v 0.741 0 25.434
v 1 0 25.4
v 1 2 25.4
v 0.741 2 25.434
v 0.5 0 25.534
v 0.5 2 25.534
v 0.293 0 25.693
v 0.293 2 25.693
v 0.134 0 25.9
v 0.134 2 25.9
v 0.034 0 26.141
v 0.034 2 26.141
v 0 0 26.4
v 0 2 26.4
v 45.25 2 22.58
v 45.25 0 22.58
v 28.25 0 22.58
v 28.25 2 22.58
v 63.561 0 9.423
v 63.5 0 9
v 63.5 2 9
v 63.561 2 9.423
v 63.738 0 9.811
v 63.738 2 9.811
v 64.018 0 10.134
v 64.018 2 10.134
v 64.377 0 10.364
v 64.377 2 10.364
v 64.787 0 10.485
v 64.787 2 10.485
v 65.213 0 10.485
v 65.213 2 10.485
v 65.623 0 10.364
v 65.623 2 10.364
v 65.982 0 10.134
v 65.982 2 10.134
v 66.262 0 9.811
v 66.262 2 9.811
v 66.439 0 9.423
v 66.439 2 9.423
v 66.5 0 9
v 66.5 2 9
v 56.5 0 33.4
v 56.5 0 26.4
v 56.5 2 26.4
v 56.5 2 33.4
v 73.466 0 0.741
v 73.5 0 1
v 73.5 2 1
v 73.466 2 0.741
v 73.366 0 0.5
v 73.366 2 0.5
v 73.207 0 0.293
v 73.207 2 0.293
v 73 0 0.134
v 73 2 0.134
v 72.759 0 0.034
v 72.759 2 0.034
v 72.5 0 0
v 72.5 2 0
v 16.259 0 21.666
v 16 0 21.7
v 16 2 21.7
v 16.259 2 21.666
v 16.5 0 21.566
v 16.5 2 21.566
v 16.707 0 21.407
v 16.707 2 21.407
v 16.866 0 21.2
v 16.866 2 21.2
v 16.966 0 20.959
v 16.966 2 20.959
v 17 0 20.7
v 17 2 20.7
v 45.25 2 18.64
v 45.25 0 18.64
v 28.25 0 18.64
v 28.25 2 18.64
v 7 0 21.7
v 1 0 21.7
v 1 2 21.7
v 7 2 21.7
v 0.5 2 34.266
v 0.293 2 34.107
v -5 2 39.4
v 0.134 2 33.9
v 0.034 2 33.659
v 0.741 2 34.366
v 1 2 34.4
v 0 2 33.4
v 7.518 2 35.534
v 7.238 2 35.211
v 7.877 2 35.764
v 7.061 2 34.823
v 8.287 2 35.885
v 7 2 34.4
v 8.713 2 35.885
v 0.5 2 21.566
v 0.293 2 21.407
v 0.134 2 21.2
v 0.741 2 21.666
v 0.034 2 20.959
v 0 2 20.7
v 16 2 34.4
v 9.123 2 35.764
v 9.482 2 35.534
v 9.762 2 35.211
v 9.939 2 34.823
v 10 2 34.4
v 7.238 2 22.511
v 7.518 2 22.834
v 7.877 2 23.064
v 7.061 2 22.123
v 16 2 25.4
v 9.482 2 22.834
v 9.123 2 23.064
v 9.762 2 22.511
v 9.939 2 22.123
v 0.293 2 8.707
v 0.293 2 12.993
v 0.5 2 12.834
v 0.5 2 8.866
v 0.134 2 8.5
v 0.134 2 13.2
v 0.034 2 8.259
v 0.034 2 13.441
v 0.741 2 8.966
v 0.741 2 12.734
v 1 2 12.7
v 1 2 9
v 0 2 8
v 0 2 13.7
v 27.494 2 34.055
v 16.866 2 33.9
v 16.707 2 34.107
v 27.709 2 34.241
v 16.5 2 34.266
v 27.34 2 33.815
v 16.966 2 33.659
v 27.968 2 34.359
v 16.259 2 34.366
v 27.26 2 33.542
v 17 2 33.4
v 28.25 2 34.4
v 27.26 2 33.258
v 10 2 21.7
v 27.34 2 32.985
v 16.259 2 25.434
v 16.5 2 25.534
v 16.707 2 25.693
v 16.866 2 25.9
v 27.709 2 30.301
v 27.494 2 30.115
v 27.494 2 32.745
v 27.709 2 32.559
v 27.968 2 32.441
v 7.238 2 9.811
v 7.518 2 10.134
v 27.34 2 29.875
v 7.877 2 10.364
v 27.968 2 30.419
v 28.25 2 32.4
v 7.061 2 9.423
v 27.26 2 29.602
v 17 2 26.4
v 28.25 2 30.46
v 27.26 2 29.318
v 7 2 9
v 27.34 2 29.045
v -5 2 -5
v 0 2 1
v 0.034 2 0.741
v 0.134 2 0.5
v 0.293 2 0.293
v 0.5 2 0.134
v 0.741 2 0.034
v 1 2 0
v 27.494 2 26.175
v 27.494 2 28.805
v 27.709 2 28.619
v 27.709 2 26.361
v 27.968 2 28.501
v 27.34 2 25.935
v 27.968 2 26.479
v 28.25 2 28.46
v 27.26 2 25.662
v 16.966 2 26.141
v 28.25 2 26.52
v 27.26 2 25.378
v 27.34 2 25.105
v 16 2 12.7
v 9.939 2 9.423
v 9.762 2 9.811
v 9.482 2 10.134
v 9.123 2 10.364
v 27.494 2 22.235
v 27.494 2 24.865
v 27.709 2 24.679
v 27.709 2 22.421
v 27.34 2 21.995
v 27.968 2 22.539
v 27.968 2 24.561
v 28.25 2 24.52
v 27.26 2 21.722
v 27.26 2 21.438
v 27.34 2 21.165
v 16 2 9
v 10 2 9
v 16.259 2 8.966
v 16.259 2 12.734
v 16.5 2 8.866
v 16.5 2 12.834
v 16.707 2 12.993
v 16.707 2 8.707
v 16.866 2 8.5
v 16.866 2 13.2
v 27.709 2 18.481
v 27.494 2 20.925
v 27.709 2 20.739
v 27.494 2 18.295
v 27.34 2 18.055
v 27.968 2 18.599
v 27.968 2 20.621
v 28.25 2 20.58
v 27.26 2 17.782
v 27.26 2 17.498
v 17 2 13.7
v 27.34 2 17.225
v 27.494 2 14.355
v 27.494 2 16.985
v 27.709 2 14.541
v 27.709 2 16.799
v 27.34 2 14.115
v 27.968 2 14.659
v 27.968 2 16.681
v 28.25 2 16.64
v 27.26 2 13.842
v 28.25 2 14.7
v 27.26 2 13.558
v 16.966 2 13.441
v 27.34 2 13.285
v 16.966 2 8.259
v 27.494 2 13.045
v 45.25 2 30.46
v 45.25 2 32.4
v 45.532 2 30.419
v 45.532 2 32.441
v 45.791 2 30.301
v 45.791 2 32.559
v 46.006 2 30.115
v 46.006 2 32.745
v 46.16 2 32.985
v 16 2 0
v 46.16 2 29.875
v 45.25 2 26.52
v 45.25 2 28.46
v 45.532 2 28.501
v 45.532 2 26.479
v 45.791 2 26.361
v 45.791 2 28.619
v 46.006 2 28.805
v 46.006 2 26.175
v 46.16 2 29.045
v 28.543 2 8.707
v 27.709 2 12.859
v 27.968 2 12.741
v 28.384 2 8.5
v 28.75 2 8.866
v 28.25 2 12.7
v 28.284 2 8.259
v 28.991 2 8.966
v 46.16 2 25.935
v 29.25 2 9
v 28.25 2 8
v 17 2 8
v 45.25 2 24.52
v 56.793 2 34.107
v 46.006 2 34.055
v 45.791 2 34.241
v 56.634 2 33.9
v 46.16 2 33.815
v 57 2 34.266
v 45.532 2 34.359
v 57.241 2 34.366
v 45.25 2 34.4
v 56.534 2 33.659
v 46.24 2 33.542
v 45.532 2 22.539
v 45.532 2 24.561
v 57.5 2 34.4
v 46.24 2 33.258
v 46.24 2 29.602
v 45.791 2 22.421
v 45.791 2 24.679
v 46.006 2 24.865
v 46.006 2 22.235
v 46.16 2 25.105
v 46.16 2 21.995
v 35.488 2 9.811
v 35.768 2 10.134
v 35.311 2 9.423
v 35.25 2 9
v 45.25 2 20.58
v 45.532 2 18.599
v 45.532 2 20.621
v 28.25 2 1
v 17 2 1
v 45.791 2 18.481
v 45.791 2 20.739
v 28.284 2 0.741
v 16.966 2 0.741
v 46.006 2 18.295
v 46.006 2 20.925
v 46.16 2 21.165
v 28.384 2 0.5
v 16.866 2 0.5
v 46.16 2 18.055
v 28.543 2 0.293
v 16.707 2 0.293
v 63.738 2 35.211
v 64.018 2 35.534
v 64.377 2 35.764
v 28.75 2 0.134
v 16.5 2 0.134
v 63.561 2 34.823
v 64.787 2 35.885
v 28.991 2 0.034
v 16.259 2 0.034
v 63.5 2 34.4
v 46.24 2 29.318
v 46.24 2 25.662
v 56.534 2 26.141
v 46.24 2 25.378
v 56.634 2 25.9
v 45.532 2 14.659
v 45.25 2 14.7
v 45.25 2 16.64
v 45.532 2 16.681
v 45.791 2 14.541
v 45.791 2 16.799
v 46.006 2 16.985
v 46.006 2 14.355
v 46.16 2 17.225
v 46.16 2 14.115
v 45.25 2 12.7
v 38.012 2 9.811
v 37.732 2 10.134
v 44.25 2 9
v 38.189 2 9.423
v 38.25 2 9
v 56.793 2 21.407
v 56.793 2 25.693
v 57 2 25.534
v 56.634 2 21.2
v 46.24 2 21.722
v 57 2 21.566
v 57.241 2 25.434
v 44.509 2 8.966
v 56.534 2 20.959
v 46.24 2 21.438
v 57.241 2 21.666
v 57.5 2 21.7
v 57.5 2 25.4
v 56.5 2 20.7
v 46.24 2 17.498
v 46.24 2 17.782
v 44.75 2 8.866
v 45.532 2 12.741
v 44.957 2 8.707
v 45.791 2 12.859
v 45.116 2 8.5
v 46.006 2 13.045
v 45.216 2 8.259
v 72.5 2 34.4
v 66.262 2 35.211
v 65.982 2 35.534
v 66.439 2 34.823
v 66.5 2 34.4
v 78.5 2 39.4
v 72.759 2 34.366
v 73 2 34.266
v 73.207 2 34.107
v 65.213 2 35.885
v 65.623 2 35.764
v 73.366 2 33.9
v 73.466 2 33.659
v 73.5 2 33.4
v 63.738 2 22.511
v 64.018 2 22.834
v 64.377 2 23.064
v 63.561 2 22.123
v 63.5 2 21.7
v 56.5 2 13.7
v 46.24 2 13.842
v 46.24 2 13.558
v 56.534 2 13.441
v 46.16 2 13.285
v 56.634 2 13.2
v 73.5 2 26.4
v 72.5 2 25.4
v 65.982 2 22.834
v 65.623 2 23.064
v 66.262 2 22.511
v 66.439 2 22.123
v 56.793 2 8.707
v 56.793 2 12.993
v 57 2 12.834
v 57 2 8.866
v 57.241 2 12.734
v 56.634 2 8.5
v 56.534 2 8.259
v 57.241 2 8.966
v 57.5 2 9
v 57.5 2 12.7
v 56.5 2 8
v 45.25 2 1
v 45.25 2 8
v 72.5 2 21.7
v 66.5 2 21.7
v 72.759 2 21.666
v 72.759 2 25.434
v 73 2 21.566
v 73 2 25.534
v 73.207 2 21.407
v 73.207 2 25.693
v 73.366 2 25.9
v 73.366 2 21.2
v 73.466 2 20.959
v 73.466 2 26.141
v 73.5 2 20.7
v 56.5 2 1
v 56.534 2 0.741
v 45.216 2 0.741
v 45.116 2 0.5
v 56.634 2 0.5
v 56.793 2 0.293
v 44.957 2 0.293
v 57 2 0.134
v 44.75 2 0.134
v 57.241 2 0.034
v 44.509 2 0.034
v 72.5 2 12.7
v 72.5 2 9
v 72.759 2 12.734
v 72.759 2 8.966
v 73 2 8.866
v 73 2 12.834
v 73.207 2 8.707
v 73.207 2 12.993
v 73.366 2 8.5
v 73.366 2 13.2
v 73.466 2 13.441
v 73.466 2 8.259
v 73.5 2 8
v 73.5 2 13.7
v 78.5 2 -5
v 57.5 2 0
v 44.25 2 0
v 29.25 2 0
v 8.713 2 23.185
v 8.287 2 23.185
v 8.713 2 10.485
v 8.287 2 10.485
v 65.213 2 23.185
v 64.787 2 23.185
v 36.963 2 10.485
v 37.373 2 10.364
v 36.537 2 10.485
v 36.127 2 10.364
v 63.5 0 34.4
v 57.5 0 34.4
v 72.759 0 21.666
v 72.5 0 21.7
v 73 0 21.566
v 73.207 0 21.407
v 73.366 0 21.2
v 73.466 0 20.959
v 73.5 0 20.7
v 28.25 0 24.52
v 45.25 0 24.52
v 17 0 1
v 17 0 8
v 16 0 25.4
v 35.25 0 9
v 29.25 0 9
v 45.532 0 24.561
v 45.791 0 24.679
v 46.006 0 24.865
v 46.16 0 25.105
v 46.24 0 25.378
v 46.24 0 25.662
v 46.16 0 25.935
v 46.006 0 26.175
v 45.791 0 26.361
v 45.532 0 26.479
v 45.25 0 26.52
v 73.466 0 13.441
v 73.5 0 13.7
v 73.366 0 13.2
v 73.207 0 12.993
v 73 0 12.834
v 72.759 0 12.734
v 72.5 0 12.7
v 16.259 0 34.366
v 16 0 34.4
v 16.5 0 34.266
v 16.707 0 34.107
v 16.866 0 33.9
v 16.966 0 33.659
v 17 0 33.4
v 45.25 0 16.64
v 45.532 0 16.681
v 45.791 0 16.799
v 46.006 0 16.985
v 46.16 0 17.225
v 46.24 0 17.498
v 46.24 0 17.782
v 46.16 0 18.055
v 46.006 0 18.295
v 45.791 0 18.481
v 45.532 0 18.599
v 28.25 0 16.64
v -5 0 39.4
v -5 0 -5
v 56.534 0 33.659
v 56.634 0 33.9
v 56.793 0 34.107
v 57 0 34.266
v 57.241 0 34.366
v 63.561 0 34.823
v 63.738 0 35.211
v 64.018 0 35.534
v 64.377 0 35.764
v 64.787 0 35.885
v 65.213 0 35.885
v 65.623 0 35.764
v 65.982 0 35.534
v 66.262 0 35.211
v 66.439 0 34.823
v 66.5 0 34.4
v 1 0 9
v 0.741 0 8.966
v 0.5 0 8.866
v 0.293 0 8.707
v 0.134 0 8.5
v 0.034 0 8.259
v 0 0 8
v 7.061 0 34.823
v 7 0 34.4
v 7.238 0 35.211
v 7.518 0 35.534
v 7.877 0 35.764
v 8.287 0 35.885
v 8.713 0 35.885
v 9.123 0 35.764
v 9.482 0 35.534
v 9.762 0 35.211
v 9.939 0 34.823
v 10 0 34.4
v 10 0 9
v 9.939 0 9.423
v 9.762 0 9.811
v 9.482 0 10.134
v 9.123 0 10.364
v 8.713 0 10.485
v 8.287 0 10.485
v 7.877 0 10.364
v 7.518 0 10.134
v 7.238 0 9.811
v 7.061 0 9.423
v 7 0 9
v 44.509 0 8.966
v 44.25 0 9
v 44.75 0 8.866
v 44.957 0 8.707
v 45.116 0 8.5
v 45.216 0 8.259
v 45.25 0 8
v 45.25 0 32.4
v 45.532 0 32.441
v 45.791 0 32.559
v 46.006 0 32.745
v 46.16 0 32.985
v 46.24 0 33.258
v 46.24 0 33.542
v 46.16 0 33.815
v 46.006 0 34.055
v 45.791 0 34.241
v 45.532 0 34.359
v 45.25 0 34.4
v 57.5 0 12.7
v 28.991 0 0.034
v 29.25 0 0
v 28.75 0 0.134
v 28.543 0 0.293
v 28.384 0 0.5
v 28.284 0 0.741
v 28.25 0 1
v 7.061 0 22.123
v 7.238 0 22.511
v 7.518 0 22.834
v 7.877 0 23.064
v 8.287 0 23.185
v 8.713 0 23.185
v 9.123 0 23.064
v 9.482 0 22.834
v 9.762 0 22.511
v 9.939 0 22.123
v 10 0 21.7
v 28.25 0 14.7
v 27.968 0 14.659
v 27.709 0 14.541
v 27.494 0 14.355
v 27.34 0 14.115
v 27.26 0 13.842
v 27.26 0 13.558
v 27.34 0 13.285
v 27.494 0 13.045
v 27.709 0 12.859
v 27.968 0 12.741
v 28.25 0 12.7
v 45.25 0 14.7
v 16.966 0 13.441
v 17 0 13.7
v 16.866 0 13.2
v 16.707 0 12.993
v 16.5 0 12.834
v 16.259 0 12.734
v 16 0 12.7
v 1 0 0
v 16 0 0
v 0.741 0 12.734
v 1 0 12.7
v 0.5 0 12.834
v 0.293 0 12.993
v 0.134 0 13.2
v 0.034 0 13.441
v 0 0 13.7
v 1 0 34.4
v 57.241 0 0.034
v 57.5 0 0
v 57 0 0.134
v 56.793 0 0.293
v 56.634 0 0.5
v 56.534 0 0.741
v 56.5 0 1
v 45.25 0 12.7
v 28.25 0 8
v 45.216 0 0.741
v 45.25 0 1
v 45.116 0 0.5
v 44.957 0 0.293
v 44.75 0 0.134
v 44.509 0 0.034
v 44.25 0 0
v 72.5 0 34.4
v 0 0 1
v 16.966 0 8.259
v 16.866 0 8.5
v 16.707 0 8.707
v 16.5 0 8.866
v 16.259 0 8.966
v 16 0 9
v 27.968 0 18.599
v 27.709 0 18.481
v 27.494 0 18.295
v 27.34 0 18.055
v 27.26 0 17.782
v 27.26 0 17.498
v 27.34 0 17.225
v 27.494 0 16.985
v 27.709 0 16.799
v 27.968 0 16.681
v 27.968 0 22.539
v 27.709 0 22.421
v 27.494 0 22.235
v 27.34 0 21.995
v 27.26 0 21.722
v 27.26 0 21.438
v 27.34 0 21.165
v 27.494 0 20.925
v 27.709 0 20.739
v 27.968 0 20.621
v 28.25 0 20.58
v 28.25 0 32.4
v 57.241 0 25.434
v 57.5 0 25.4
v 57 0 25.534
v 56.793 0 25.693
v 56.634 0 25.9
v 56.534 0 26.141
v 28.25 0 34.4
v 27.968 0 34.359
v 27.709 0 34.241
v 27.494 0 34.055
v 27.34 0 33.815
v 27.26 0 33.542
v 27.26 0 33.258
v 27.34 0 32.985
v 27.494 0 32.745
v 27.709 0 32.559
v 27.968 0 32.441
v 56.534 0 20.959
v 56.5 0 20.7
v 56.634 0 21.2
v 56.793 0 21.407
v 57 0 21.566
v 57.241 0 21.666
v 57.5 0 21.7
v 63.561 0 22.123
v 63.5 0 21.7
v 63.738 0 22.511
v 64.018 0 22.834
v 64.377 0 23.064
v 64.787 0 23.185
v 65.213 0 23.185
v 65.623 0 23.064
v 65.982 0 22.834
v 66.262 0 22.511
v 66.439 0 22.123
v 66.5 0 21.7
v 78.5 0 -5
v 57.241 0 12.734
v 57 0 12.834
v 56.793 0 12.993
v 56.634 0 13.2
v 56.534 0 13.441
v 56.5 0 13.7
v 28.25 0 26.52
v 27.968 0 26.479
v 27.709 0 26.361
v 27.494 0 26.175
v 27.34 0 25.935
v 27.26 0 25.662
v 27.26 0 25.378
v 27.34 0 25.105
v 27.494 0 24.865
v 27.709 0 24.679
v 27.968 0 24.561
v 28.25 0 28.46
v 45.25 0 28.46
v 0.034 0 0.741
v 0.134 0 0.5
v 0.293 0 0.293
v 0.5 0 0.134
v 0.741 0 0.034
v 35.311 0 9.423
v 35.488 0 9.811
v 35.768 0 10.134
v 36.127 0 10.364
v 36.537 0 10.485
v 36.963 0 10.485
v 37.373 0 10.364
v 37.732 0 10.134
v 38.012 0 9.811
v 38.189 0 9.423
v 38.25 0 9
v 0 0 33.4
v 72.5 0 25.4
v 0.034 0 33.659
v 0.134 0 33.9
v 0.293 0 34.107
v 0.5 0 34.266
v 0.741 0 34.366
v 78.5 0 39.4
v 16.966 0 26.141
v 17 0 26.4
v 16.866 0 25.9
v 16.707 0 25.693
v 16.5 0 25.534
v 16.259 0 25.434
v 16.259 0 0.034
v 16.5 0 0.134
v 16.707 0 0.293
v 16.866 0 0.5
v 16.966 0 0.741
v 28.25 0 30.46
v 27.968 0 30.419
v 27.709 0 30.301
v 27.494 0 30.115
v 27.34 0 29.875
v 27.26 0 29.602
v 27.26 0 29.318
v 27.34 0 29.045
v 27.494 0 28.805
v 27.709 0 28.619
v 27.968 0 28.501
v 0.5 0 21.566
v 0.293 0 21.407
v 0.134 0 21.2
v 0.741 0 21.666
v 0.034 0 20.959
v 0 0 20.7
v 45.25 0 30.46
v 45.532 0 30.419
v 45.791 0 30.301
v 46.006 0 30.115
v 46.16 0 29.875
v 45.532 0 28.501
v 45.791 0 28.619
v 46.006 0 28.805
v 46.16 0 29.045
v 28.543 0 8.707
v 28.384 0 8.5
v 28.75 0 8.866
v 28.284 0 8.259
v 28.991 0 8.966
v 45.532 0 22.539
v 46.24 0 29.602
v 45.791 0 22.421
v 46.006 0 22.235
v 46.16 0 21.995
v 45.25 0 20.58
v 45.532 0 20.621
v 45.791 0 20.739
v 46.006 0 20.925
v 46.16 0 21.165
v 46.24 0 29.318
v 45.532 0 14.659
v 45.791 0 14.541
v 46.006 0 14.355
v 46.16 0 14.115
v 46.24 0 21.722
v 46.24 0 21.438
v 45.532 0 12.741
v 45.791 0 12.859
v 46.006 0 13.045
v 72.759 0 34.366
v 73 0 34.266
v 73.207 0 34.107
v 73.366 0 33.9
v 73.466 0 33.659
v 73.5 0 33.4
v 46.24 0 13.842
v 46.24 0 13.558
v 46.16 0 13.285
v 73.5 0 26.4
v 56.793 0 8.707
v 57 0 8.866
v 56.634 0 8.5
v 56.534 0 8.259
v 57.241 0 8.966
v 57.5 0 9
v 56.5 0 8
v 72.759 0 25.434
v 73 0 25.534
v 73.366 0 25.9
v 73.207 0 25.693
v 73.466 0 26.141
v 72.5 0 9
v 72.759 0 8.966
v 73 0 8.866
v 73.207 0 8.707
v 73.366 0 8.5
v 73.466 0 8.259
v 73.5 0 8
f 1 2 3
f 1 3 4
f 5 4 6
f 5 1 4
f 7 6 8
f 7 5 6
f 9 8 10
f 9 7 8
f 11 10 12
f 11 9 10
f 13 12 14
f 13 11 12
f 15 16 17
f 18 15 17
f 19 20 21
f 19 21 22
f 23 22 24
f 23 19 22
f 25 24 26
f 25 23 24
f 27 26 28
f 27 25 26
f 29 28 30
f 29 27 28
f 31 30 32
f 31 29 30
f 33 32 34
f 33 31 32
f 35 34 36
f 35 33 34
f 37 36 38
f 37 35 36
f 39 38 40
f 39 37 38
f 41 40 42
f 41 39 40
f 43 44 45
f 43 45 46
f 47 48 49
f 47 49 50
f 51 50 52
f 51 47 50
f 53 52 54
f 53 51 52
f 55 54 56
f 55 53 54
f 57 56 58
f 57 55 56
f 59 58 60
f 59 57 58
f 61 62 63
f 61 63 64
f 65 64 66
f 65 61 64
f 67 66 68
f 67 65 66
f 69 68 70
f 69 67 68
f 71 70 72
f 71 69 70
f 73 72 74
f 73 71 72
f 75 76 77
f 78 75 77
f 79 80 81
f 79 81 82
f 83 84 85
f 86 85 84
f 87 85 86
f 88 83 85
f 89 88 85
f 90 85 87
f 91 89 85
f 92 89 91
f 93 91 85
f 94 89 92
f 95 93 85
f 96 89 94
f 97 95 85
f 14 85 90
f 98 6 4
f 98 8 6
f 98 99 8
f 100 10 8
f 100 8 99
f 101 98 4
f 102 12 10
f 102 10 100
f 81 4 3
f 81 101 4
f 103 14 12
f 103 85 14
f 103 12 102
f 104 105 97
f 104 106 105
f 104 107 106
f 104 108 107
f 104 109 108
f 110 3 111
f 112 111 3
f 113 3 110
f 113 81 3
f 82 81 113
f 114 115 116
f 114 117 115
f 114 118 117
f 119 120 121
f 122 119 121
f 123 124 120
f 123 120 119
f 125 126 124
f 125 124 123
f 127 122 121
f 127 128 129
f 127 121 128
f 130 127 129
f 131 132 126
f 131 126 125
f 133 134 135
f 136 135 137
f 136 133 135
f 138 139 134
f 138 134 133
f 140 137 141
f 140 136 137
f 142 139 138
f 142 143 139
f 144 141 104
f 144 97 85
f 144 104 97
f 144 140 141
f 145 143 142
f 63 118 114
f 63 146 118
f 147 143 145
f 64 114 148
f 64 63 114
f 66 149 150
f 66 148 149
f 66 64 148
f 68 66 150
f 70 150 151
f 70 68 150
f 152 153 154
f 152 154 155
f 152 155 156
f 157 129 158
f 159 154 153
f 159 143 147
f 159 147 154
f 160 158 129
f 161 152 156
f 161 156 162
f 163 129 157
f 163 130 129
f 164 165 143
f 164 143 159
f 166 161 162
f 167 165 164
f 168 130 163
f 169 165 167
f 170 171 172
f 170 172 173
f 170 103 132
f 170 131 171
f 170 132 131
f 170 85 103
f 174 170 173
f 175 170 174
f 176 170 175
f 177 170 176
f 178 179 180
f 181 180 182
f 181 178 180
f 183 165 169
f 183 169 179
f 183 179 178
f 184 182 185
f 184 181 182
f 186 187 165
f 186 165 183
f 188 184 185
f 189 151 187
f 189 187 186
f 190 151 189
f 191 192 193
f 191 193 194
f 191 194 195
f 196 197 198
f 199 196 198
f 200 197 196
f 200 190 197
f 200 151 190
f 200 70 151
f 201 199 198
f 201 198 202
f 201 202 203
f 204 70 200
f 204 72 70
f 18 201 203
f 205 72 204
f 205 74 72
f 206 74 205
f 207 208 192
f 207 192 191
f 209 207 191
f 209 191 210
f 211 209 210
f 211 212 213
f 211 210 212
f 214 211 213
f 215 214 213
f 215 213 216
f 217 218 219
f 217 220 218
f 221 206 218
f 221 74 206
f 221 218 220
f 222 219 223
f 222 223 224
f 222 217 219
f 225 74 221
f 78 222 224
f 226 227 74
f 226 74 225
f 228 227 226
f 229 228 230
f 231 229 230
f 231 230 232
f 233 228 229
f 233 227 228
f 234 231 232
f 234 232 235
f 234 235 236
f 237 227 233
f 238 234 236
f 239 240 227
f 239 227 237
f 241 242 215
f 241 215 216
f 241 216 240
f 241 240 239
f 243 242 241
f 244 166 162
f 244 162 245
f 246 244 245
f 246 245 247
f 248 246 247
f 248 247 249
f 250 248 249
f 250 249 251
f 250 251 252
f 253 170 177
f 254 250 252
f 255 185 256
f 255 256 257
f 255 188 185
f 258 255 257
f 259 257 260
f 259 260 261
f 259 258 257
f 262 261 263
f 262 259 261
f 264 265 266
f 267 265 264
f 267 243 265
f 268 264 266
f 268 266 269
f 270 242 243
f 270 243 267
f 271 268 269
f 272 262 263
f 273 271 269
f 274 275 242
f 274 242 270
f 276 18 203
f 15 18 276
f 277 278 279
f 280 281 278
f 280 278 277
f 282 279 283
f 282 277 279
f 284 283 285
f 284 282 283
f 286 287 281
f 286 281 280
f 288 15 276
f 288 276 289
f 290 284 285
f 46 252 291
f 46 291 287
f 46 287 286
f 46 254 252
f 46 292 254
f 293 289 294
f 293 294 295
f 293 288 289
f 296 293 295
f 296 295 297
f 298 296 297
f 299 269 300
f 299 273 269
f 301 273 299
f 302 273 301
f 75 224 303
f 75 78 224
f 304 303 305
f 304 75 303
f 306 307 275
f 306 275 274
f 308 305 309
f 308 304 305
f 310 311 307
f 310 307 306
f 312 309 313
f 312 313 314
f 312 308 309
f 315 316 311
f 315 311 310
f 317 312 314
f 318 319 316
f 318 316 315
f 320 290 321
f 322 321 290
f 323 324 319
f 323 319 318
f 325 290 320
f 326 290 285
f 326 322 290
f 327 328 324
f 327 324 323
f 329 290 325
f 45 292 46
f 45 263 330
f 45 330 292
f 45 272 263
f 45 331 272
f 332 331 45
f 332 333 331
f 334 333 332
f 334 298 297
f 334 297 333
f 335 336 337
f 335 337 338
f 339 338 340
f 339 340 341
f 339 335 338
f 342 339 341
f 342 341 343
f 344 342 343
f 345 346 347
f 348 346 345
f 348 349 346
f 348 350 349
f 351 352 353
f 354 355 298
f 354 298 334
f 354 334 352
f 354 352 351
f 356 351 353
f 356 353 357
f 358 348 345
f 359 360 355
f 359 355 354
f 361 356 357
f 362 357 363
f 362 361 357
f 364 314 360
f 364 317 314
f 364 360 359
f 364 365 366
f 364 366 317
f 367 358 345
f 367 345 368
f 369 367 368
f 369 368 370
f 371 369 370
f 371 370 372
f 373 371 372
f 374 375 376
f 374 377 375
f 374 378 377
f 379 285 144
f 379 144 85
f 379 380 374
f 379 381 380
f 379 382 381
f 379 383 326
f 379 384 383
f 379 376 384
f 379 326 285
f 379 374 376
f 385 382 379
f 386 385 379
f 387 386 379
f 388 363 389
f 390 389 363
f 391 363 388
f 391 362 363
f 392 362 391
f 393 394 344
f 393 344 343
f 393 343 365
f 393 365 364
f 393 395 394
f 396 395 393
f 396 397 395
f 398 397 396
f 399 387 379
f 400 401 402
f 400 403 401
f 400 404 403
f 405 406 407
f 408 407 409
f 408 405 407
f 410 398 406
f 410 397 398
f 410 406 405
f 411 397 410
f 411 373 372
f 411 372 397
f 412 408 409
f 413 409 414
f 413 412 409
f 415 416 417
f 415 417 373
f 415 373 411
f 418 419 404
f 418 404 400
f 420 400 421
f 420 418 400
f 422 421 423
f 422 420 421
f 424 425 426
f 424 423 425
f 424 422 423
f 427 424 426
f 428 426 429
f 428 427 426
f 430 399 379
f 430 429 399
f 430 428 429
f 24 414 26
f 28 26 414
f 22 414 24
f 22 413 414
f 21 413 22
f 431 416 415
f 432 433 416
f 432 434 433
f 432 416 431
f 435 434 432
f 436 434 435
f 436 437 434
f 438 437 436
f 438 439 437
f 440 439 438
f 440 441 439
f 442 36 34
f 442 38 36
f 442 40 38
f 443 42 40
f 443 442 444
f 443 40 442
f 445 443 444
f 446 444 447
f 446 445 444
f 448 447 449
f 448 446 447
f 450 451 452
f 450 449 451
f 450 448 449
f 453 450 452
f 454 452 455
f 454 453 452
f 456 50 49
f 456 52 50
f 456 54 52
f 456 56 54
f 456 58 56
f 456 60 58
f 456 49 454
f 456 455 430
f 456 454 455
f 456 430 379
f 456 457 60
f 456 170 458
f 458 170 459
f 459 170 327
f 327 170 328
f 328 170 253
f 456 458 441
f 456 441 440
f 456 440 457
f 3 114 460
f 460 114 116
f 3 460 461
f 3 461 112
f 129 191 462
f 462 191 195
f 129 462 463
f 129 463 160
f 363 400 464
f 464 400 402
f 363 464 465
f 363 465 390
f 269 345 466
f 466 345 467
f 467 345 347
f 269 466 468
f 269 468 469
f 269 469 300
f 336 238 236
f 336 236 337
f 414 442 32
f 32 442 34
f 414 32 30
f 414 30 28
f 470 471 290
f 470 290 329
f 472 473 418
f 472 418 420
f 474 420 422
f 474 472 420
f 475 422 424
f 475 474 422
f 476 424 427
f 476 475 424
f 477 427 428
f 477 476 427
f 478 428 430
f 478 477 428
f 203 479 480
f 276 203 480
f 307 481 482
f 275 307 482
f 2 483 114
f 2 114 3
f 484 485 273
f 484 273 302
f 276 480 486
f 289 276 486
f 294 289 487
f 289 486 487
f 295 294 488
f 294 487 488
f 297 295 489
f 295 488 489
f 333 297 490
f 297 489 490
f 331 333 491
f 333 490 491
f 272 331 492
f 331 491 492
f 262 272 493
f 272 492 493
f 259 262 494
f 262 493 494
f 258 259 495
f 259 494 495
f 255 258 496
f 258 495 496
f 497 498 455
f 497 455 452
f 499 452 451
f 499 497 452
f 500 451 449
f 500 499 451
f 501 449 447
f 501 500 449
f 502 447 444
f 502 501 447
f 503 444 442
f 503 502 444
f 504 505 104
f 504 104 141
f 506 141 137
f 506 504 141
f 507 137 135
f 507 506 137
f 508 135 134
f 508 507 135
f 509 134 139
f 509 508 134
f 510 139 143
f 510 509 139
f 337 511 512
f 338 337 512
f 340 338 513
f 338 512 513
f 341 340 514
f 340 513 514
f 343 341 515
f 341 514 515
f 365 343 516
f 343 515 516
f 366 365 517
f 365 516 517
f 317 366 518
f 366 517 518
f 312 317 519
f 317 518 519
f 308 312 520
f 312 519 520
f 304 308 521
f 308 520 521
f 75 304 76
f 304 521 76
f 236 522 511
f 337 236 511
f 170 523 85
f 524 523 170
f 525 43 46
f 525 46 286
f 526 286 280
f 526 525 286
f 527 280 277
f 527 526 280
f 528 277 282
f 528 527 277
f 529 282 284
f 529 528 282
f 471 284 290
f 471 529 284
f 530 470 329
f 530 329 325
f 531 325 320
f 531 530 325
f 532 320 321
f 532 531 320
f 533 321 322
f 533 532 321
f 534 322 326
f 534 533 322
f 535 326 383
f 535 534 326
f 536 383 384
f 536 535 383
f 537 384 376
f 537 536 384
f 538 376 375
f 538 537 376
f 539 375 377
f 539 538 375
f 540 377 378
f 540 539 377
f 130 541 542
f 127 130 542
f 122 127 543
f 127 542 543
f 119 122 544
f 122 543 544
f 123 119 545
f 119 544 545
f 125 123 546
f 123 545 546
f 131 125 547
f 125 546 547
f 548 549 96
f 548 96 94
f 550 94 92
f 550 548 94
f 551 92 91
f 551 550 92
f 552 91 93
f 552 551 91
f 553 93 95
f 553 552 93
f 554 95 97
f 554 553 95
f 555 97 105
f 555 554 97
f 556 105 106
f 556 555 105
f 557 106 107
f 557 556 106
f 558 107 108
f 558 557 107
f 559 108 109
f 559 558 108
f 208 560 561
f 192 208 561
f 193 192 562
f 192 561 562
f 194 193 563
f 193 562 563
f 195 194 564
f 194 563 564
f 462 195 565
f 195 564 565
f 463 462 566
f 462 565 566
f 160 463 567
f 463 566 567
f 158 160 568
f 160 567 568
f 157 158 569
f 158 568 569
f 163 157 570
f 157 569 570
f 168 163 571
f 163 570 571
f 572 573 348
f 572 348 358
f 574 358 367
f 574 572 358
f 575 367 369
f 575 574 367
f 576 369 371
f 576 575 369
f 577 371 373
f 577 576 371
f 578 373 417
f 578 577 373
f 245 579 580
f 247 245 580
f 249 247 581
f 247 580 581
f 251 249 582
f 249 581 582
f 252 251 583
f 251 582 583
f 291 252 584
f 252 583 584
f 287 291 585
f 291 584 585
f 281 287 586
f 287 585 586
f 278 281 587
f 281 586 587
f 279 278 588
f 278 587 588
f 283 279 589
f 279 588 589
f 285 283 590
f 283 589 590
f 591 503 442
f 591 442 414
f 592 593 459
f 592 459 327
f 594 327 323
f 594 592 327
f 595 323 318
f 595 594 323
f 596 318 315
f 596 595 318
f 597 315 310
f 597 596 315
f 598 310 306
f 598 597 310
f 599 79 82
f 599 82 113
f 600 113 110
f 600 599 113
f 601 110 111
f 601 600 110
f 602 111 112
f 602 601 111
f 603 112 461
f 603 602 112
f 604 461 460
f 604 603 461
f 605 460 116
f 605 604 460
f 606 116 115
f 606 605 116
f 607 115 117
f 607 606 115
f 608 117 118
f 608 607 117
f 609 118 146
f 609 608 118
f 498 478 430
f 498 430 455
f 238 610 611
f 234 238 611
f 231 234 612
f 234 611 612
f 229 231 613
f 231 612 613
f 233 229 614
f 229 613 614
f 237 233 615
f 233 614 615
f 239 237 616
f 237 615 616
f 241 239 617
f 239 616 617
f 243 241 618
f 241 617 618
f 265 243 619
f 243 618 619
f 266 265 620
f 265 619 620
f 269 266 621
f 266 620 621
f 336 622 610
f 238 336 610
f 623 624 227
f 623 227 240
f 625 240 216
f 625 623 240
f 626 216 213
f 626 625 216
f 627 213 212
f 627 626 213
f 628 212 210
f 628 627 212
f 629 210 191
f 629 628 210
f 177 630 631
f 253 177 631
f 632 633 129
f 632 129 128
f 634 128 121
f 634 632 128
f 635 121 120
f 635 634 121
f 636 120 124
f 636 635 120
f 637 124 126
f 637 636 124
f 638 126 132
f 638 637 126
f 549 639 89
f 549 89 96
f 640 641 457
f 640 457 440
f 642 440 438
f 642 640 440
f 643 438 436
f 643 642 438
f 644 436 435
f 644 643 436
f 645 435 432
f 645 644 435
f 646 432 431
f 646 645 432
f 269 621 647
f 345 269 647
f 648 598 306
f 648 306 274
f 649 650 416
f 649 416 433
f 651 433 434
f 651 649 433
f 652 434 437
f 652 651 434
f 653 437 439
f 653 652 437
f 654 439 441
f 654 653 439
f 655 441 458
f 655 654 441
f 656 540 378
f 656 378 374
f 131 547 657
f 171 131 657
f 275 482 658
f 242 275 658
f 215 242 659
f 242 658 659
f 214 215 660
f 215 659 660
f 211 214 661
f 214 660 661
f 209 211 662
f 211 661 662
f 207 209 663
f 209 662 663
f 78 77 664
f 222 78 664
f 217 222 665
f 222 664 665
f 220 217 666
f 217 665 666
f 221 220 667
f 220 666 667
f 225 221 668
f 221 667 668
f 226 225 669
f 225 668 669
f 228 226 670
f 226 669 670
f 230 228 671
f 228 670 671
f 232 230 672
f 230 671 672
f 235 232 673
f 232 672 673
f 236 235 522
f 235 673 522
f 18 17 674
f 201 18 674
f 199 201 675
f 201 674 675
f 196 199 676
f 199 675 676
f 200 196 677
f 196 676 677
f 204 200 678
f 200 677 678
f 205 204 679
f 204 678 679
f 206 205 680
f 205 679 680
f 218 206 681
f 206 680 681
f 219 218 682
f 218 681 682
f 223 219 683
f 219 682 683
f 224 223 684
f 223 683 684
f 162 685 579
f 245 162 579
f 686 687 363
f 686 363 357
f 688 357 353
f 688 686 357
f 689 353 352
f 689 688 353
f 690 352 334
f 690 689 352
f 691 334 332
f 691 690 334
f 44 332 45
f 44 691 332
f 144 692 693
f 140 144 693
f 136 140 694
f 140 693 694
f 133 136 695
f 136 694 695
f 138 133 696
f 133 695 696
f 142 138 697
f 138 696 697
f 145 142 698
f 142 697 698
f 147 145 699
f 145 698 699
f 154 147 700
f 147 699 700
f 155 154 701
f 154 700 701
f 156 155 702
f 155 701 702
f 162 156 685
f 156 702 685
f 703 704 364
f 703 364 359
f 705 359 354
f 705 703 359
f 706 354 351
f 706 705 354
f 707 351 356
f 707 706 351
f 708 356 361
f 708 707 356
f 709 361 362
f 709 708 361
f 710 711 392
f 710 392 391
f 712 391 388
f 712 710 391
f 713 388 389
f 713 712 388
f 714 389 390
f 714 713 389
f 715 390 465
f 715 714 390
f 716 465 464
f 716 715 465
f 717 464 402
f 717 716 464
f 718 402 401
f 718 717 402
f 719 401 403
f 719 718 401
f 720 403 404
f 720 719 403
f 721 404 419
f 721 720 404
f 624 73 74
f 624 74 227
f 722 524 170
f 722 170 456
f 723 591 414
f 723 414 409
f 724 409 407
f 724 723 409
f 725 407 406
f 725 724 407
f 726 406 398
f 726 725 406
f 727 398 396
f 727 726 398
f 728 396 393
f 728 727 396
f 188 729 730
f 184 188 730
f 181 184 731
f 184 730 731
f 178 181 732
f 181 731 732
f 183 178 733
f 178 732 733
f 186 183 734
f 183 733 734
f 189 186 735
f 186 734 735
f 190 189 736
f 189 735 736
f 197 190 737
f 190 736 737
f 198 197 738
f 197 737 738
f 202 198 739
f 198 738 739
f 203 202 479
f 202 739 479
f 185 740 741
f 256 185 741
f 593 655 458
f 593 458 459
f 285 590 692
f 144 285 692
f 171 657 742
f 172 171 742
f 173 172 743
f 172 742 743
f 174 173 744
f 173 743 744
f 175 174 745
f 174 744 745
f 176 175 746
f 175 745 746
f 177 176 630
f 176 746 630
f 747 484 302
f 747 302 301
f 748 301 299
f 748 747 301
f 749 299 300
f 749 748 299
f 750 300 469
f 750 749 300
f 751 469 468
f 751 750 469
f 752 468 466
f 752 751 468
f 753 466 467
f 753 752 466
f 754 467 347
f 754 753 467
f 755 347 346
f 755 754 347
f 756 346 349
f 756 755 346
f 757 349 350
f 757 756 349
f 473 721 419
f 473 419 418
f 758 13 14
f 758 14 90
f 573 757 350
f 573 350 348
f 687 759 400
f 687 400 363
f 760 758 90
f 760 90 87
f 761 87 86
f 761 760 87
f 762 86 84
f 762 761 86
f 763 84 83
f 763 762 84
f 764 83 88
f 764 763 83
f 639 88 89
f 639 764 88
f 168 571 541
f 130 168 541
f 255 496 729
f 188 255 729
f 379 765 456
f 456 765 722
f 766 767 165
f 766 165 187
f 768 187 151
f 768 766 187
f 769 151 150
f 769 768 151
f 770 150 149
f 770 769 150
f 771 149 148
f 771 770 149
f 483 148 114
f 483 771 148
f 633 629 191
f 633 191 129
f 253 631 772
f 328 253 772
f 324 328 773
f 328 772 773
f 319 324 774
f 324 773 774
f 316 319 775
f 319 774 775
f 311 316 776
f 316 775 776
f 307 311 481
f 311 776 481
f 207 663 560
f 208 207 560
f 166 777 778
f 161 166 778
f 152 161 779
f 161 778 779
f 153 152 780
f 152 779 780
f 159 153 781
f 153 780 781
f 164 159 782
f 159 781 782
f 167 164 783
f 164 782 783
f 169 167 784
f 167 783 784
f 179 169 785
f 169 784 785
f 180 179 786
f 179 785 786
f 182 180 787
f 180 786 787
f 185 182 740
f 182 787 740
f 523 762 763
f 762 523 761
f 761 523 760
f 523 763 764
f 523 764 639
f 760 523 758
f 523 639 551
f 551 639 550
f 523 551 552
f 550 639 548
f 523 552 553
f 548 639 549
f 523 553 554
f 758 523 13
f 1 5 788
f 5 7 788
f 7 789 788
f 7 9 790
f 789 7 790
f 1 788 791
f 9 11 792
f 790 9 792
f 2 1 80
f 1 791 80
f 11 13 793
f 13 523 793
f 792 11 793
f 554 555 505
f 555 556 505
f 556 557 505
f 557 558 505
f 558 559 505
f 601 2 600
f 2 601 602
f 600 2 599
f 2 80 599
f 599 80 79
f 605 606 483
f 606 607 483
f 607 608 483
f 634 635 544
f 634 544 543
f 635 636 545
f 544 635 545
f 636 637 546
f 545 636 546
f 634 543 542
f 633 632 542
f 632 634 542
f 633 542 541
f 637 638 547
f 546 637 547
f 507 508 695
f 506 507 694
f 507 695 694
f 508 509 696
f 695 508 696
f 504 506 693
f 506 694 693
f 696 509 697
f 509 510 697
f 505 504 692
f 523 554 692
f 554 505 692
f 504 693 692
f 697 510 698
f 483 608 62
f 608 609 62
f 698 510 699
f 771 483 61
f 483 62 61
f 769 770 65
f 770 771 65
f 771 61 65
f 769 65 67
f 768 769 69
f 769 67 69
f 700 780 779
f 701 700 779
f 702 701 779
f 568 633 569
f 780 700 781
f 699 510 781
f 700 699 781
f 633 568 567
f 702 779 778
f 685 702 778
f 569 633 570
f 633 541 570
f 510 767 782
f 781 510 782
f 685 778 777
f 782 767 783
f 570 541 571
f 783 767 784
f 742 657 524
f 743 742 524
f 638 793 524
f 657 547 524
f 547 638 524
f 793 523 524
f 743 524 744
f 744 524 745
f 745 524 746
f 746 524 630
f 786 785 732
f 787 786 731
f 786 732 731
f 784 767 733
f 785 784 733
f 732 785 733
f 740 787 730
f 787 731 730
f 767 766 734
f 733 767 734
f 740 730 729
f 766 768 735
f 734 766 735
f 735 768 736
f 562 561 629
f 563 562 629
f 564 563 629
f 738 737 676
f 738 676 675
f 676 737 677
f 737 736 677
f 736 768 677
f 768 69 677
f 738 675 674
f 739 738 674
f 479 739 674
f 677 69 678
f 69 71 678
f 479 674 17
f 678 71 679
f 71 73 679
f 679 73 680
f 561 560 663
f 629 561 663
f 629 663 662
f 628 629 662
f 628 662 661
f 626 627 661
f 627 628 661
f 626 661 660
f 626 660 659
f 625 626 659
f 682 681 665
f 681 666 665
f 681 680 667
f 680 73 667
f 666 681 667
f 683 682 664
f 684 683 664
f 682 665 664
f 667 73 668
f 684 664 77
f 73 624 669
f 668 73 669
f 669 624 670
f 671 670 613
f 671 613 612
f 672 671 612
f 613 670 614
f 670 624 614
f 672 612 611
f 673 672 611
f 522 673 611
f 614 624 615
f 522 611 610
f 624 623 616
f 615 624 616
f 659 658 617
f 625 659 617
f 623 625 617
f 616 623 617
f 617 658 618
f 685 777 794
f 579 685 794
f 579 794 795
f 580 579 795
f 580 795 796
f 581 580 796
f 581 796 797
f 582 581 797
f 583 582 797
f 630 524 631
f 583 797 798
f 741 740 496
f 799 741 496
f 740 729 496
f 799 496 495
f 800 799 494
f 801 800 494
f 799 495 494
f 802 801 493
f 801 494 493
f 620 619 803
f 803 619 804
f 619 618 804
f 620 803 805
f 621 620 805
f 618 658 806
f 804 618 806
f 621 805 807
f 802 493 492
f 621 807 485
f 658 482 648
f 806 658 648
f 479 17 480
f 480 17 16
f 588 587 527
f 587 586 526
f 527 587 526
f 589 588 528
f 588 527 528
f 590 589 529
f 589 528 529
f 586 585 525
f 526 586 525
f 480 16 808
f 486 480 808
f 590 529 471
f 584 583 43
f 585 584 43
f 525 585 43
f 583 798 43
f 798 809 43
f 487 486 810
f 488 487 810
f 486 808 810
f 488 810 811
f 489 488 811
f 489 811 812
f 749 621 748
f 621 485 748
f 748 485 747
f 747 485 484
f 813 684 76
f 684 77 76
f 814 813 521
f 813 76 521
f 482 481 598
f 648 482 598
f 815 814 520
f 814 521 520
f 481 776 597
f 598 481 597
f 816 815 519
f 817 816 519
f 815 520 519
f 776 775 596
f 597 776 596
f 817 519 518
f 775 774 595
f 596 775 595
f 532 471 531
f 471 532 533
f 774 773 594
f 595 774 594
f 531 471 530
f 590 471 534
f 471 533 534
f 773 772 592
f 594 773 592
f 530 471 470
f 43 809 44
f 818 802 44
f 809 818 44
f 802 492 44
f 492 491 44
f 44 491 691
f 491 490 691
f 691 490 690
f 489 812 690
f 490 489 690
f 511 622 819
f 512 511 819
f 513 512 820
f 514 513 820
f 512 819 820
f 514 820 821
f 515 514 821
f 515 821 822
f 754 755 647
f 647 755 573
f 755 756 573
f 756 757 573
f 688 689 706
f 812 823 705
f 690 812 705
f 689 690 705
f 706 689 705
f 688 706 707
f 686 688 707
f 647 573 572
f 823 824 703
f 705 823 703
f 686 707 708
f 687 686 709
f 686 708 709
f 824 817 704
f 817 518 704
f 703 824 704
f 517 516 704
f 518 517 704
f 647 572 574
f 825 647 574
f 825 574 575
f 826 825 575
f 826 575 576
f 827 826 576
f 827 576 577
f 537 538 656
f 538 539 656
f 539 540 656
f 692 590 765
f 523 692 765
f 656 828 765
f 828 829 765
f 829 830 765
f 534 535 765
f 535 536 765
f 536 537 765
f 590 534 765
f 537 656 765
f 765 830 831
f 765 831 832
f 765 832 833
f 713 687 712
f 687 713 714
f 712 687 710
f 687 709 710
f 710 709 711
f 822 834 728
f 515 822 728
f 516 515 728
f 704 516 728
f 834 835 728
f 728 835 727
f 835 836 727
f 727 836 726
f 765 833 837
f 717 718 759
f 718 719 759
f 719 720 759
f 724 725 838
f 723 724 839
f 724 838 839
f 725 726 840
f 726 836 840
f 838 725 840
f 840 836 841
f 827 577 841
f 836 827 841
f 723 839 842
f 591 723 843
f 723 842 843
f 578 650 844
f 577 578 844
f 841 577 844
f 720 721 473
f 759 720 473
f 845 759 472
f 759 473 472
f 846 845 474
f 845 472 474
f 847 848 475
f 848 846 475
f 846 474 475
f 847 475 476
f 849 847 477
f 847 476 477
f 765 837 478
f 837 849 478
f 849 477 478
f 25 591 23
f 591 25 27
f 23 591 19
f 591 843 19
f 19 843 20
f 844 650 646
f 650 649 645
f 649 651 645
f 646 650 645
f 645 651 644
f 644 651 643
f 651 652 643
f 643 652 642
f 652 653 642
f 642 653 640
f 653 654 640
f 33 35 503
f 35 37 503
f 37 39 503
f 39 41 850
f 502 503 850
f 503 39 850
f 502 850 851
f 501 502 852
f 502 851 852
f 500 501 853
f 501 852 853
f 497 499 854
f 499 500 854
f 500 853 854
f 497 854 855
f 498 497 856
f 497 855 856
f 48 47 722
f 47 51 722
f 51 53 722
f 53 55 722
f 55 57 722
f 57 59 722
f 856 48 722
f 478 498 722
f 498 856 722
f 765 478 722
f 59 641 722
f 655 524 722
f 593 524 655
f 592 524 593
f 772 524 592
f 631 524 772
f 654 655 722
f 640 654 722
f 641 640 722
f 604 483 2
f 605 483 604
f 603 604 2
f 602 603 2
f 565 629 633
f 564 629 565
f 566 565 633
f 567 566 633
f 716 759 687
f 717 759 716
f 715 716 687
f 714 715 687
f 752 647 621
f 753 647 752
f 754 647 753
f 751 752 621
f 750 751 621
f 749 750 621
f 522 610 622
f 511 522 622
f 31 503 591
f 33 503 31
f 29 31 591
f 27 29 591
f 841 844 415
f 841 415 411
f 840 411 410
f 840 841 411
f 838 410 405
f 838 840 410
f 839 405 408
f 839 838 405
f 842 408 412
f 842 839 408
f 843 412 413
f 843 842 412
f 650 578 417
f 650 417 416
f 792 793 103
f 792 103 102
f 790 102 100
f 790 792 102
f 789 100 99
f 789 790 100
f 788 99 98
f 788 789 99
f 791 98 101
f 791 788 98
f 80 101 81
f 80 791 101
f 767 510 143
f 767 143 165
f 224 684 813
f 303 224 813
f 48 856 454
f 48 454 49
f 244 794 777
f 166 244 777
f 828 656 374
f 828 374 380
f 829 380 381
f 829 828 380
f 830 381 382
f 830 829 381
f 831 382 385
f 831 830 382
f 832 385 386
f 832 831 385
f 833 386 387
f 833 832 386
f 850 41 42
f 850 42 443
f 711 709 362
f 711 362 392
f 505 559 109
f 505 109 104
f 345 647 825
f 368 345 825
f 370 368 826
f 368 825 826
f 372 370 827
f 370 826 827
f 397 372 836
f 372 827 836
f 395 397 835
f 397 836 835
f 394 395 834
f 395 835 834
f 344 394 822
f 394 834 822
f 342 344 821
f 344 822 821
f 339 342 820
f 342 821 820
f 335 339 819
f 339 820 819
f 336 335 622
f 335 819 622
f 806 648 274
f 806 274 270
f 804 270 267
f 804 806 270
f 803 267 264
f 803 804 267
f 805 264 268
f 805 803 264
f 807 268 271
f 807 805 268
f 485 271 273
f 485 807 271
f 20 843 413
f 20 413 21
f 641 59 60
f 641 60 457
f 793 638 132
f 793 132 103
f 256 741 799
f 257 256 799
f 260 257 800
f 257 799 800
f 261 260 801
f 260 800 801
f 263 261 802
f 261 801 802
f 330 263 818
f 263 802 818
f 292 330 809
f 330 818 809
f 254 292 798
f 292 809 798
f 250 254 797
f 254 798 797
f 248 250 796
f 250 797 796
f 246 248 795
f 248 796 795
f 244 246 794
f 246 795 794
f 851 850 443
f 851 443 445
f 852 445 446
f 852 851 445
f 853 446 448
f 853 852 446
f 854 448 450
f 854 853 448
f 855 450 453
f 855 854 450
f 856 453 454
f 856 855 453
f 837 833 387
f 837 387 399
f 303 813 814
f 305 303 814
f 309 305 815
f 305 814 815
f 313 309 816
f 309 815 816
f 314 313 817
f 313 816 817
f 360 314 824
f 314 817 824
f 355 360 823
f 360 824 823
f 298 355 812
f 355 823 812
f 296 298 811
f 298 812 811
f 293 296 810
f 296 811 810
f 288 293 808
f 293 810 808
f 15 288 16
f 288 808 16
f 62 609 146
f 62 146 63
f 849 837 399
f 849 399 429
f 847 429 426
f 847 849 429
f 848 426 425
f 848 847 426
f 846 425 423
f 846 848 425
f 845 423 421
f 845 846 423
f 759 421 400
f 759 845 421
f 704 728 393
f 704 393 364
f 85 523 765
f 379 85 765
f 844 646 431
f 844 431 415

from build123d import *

# Parameters (mm, degrees)
SKETCH1_W           = 83.5
SKETCH1_H           = 44.4
BOSS_EXTRUDE1_DEPTH = 2


with BuildPart() as part:
    # Sketch1 → Boss-Extrude1 (new body)
    with BuildSketch(Plane(origin=(0, 0, 0), x_dir=(1, 0, 0), z_dir=(0, 1, 0))):
        with Locations((36.75, -17.2)):
            Rectangle(SKETCH1_W, SKETCH1_H)
        with BuildLine():
            Line((29.25, -9), (35.25, -9))
            ThreePointArc((35.25, -9), (36.75, -10.5), (38.25, -9))
            Line((38.25, -9), (44.25, -9))
            ThreePointArc((44.25, -9), (44.957106781, -8.707106781), (45.25, -8))
            Line((45.25, -8), (45.25, -1))
            ThreePointArc((45.25, -1), (44.957106781, -0.292893219), (44.25, 0))
            Line((44.25, 0), (29.25, 0))
            ThreePointArc((29.25, 0), (28.542893219, -0.292893219), (28.25, -1))
            Line((28.25, -1), (28.25, -8))
            ThreePointArc((28.25, -8), (28.542893219, -8.707106781), (29.25, -9))
        make_face(mode=Mode.SUBTRACT)
        with BuildLine():
            Line((1, 0), (16, 0))
            ThreePointArc((16, 0), (16.707106781, -0.292893219), (17, -1))
            Line((17, -1), (17, -8))
            ThreePointArc((17, -8), (16.707106781, -8.707106781), (16, -9))
            Line((16, -9), (10, -9))
            ThreePointArc((10, -9), (8.5, -10.5), (7, -9))
            Line((7, -9), (1, -9))
            ThreePointArc((1, -9), (0.292893219, -8.707106781), (0, -8))
            Line((0, -8), (0, -1))
            ThreePointArc((0, -1), (0.292893219, -0.292893219), (1, 0))
        make_face(mode=Mode.SUBTRACT)
        with BuildLine():
            Line((57.5, -9), (63.5, -9))
            ThreePointArc((63.5, -9), (65, -10.5), (66.5, -9))
            Line((66.5, -9), (72.5, -9))
            ThreePointArc((72.5, -9), (73.207106781, -8.707106781), (73.5, -8))
            Line((73.5, -8), (73.5, -1))
            ThreePointArc((73.5, -1), (73.207106781, -0.292893219), (72.5, 0))
            Line((72.5, 0), (57.5, 0))
            ThreePointArc((57.5, 0), (56.792893219, -0.292893219), (56.5, -1))
            Line((56.5, -1), (56.5, -8))
            ThreePointArc((56.5, -8), (56.792893219, -8.707106781), (57.5, -9))
        make_face(mode=Mode.SUBTRACT)
        with BuildLine():
            Line((57.5, -21.7), (63.5, -21.7))
            ThreePointArc((63.5, -21.7), (65, -23.2), (66.5, -21.7))
            Line((66.5, -21.7), (72.5, -21.7))
            ThreePointArc((72.5, -21.7), (73.207106781, -21.407106781), (73.5, -20.7))
            Line((73.5, -20.7), (73.5, -13.7))
            ThreePointArc((73.5, -13.7), (73.207106781, -12.992893219), (72.5, -12.7))
            Line((72.5, -12.7), (57.5, -12.7))
            ThreePointArc((57.5, -12.7), (56.792893219, -12.992893219), (56.5, -13.7))
            Line((56.5, -13.7), (56.5, -20.7))
            ThreePointArc((56.5, -20.7), (56.792893219, -21.407106781), (57.5, -21.7))
        make_face(mode=Mode.SUBTRACT)
        with BuildLine():
            Line((57.5, -34.4), (63.5, -34.4))
            ThreePointArc((63.5, -34.4), (65, -35.9), (66.5, -34.4))
            Line((66.5, -34.4), (72.5, -34.4))
            ThreePointArc((72.5, -34.4), (73.207106781, -34.107106781), (73.5, -33.4))
            Line((73.5, -33.4), (73.5, -26.4))
            ThreePointArc((73.5, -26.4), (73.207106781, -25.692893219), (72.5, -25.4))
            Line((72.5, -25.4), (57.5, -25.4))
            ThreePointArc((57.5, -25.4), (56.792893219, -25.692893219), (56.5, -26.4))
            Line((56.5, -26.4), (56.5, -33.4))
            ThreePointArc((56.5, -33.4), (56.792893219, -34.107106781), (57.5, -34.4))
        make_face(mode=Mode.SUBTRACT)
        with BuildLine():
            Line((1, -21.7), (7, -21.7))
            ThreePointArc((7, -21.7), (8.5, -23.2), (10, -21.7))
            Line((10, -21.7), (16, -21.7))
            ThreePointArc((16, -21.7), (16.707106781, -21.407106781), (17, -20.7))
            Line((17, -20.7), (17, -13.7))
            ThreePointArc((17, -13.7), (16.707106781, -12.992893219), (16, -12.7))
            Line((16, -12.7), (1, -12.7))
            ThreePointArc((1, -12.7), (0.292893219, -12.992893219), (0, -13.7))
            Line((0, -13.7), (0, -20.7))
            ThreePointArc((0, -20.7), (0.292893219, -21.407106781), (1, -21.7))
        make_face(mode=Mode.SUBTRACT)
        with BuildLine():
            Line((1, -34.4), (7, -34.4))
            ThreePointArc((7, -34.4), (8.5, -35.9), (10, -34.4))
            Line((10, -34.4), (16, -34.4))
            ThreePointArc((16, -34.4), (16.707106781, -34.107106781), (17, -33.4))
            Line((17, -33.4), (17, -26.4))
            ThreePointArc((17, -26.4), (16.707106781, -25.692893219), (16, -25.4))
            Line((16, -25.4), (1, -25.4))
            ThreePointArc((1, -25.4), (0.292893219, -25.692893219), (0, -26.4))
            Line((0, -26.4), (0, -33.4))
            ThreePointArc((0, -33.4), (0.292893219, -34.107106781), (1, -34.4))
        make_face(mode=Mode.SUBTRACT)
        with BuildLine():
            Line((28.25, -16.64), (45.25, -16.64))
            ThreePointArc((45.25, -16.64), (46.25, -17.64), (45.25, -18.64))
            Line((45.25, -18.64), (28.25, -18.64))
            ThreePointArc((28.25, -18.64), (27.25, -17.64), (28.25, -16.64))
        make_face(mode=Mode.SUBTRACT)
        with BuildLine():
            Line((28.25, -12.7), (45.25, -12.7))
            ThreePointArc((45.25, -12.7), (46.25, -13.7), (45.25, -14.7))
            Line((45.25, -14.7), (28.25, -14.7))
            ThreePointArc((28.25, -14.7), (27.25, -13.7), (28.25, -12.7))
        make_face(mode=Mode.SUBTRACT)
        with BuildLine():
            Line((28.25, -20.58), (45.25, -20.58))
            ThreePointArc((45.25, -20.58), (46.25, -21.58), (45.25, -22.58))
            Line((45.25, -22.58), (28.25, -22.58))
            ThreePointArc((28.25, -22.58), (27.25, -21.58), (28.25, -20.58))
        make_face(mode=Mode.SUBTRACT)
        with BuildLine():
            Line((28.25, -24.52), (45.25, -24.52))
            ThreePointArc((45.25, -24.52), (46.25, -25.52), (45.25, -26.52))
            Line((45.25, -26.52), (28.25, -26.52))
            ThreePointArc((28.25, -26.52), (27.25, -25.52), (28.25, -24.52))
        make_face(mode=Mode.SUBTRACT)
        with BuildLine():
            Line((28.25, -28.46), (45.25, -28.46))
            ThreePointArc((45.25, -28.46), (46.25, -29.46), (45.25, -30.46))
            Line((45.25, -30.46), (28.25, -30.46))
            ThreePointArc((28.25, -30.46), (27.25, -29.46), (28.25, -28.46))
        make_face(mode=Mode.SUBTRACT)
        with BuildLine():
            Line((28.25, -32.4), (45.25, -32.4))
            ThreePointArc((45.25, -32.4), (46.25, -33.4), (45.25, -34.4))
            Line((45.25, -34.4), (28.25, -34.4))
            ThreePointArc((28.25, -34.4), (27.25, -33.4), (28.25, -32.4))
        make_face(mode=Mode.SUBTRACT)
    extrude(amount=BOSS_EXTRUDE1_DEPTH)


solid = part.part
